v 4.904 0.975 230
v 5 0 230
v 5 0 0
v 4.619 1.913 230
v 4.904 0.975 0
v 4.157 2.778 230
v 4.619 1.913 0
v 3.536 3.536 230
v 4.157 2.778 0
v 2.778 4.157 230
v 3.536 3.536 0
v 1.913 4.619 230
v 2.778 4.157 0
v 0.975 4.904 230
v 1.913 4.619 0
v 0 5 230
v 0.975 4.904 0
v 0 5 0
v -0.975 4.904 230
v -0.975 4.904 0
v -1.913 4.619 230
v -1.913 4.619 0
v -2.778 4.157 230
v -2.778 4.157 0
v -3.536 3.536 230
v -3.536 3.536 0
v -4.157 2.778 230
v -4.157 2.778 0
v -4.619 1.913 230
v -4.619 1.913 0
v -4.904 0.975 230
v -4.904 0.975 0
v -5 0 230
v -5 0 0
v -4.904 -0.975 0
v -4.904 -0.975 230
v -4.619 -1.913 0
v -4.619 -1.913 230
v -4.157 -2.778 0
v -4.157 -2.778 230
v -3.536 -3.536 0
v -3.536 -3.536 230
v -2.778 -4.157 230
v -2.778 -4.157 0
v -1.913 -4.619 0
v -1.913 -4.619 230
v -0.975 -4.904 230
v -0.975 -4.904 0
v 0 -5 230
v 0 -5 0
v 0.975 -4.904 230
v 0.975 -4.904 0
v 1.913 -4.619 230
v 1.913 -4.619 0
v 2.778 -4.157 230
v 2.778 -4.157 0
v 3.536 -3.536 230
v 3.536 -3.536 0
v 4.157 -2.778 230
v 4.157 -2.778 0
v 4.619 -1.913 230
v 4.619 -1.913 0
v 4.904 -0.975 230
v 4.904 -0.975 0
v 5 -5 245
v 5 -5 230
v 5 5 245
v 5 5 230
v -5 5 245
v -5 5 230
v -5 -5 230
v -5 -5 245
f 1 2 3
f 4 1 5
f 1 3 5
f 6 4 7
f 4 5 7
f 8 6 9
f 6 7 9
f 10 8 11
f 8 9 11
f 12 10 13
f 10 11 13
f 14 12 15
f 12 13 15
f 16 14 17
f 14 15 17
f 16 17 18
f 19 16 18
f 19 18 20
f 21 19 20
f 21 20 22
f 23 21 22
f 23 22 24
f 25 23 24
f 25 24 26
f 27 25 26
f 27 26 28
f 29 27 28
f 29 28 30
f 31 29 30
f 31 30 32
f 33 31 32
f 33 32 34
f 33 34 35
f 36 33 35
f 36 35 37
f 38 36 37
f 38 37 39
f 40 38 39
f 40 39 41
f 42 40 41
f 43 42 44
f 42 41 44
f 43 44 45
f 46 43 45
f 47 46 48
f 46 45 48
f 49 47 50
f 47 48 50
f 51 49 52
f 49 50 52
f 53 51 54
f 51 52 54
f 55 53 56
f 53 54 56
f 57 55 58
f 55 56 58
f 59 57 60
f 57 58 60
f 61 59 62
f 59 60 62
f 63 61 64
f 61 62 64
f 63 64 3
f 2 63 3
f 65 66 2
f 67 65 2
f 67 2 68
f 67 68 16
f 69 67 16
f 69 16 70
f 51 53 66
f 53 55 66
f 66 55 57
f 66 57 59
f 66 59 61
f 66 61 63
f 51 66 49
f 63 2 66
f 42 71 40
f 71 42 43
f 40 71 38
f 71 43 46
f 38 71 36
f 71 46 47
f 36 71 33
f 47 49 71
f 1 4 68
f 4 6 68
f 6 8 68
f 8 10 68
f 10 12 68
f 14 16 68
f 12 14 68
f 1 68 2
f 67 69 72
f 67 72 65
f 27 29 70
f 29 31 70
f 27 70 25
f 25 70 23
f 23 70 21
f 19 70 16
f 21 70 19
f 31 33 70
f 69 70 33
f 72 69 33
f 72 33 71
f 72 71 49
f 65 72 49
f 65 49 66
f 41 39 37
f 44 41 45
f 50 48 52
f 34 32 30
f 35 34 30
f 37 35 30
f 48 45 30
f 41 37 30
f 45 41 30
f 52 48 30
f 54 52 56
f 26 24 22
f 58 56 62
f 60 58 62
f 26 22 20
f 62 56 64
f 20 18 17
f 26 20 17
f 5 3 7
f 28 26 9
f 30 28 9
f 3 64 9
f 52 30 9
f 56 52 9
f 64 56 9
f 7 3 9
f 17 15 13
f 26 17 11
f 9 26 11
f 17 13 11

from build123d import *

# Parameters (mm, degrees)
F0_R     = 5
F1_DEPTH = 230
F3_DEPTH = 15


with BuildPart() as f1:
    # F0 (on Top) → F1 (new body)
    with BuildSketch(Plane.XY):
        Circle(F0_R)
    extrude(amount=F1_DEPTH)

    # F2 (on face) → F3 (join)
    with BuildSketch(Plane.XY.offset(230)):
        with BuildLine():
            ThreePointArc((-5, 0), (-3.535534, 3.535534), (0, 5))
            Line((0, 5), (-5, 5))
            Line((-5, 5), (-5, 0))
        make_face()
        with BuildLine():
            Line((5, 0), (5, 5))
            Line((5, 5), (0, 5))
            ThreePointArc((0, 5), (3.535534, 3.535534), (5, 0))
        make_face()
        with BuildLine():
            ThreePointArc((5, 0), (3.535534, 3.535534), (0, 5))
            ThreePointArc((0, 5), (-3.535534, 3.535534), (-5, 0))
            ThreePointArc((-5, 0), (-3.535534, -3.535534), (0, -5))
            ThreePointArc((0, -5), (3.535534, -3.535534), (5, 0))
        make_face()
        with BuildLine():
            Line((5, -5), (5, 0))
            ThreePointArc((5, 0), (3.535534, -3.535534), (0, -5))
            Line((0, -5), (5, -5))
        make_face()
        with BuildLine():
            ThreePointArc((0, -5), (-3.535534, -3.535534), (-5, 0))
            Line((-5, 0), (-5, -5))
            Line((-5, -5), (0, -5))
        make_face()
    extrude(amount=F3_DEPTH)


solid = f1.part
